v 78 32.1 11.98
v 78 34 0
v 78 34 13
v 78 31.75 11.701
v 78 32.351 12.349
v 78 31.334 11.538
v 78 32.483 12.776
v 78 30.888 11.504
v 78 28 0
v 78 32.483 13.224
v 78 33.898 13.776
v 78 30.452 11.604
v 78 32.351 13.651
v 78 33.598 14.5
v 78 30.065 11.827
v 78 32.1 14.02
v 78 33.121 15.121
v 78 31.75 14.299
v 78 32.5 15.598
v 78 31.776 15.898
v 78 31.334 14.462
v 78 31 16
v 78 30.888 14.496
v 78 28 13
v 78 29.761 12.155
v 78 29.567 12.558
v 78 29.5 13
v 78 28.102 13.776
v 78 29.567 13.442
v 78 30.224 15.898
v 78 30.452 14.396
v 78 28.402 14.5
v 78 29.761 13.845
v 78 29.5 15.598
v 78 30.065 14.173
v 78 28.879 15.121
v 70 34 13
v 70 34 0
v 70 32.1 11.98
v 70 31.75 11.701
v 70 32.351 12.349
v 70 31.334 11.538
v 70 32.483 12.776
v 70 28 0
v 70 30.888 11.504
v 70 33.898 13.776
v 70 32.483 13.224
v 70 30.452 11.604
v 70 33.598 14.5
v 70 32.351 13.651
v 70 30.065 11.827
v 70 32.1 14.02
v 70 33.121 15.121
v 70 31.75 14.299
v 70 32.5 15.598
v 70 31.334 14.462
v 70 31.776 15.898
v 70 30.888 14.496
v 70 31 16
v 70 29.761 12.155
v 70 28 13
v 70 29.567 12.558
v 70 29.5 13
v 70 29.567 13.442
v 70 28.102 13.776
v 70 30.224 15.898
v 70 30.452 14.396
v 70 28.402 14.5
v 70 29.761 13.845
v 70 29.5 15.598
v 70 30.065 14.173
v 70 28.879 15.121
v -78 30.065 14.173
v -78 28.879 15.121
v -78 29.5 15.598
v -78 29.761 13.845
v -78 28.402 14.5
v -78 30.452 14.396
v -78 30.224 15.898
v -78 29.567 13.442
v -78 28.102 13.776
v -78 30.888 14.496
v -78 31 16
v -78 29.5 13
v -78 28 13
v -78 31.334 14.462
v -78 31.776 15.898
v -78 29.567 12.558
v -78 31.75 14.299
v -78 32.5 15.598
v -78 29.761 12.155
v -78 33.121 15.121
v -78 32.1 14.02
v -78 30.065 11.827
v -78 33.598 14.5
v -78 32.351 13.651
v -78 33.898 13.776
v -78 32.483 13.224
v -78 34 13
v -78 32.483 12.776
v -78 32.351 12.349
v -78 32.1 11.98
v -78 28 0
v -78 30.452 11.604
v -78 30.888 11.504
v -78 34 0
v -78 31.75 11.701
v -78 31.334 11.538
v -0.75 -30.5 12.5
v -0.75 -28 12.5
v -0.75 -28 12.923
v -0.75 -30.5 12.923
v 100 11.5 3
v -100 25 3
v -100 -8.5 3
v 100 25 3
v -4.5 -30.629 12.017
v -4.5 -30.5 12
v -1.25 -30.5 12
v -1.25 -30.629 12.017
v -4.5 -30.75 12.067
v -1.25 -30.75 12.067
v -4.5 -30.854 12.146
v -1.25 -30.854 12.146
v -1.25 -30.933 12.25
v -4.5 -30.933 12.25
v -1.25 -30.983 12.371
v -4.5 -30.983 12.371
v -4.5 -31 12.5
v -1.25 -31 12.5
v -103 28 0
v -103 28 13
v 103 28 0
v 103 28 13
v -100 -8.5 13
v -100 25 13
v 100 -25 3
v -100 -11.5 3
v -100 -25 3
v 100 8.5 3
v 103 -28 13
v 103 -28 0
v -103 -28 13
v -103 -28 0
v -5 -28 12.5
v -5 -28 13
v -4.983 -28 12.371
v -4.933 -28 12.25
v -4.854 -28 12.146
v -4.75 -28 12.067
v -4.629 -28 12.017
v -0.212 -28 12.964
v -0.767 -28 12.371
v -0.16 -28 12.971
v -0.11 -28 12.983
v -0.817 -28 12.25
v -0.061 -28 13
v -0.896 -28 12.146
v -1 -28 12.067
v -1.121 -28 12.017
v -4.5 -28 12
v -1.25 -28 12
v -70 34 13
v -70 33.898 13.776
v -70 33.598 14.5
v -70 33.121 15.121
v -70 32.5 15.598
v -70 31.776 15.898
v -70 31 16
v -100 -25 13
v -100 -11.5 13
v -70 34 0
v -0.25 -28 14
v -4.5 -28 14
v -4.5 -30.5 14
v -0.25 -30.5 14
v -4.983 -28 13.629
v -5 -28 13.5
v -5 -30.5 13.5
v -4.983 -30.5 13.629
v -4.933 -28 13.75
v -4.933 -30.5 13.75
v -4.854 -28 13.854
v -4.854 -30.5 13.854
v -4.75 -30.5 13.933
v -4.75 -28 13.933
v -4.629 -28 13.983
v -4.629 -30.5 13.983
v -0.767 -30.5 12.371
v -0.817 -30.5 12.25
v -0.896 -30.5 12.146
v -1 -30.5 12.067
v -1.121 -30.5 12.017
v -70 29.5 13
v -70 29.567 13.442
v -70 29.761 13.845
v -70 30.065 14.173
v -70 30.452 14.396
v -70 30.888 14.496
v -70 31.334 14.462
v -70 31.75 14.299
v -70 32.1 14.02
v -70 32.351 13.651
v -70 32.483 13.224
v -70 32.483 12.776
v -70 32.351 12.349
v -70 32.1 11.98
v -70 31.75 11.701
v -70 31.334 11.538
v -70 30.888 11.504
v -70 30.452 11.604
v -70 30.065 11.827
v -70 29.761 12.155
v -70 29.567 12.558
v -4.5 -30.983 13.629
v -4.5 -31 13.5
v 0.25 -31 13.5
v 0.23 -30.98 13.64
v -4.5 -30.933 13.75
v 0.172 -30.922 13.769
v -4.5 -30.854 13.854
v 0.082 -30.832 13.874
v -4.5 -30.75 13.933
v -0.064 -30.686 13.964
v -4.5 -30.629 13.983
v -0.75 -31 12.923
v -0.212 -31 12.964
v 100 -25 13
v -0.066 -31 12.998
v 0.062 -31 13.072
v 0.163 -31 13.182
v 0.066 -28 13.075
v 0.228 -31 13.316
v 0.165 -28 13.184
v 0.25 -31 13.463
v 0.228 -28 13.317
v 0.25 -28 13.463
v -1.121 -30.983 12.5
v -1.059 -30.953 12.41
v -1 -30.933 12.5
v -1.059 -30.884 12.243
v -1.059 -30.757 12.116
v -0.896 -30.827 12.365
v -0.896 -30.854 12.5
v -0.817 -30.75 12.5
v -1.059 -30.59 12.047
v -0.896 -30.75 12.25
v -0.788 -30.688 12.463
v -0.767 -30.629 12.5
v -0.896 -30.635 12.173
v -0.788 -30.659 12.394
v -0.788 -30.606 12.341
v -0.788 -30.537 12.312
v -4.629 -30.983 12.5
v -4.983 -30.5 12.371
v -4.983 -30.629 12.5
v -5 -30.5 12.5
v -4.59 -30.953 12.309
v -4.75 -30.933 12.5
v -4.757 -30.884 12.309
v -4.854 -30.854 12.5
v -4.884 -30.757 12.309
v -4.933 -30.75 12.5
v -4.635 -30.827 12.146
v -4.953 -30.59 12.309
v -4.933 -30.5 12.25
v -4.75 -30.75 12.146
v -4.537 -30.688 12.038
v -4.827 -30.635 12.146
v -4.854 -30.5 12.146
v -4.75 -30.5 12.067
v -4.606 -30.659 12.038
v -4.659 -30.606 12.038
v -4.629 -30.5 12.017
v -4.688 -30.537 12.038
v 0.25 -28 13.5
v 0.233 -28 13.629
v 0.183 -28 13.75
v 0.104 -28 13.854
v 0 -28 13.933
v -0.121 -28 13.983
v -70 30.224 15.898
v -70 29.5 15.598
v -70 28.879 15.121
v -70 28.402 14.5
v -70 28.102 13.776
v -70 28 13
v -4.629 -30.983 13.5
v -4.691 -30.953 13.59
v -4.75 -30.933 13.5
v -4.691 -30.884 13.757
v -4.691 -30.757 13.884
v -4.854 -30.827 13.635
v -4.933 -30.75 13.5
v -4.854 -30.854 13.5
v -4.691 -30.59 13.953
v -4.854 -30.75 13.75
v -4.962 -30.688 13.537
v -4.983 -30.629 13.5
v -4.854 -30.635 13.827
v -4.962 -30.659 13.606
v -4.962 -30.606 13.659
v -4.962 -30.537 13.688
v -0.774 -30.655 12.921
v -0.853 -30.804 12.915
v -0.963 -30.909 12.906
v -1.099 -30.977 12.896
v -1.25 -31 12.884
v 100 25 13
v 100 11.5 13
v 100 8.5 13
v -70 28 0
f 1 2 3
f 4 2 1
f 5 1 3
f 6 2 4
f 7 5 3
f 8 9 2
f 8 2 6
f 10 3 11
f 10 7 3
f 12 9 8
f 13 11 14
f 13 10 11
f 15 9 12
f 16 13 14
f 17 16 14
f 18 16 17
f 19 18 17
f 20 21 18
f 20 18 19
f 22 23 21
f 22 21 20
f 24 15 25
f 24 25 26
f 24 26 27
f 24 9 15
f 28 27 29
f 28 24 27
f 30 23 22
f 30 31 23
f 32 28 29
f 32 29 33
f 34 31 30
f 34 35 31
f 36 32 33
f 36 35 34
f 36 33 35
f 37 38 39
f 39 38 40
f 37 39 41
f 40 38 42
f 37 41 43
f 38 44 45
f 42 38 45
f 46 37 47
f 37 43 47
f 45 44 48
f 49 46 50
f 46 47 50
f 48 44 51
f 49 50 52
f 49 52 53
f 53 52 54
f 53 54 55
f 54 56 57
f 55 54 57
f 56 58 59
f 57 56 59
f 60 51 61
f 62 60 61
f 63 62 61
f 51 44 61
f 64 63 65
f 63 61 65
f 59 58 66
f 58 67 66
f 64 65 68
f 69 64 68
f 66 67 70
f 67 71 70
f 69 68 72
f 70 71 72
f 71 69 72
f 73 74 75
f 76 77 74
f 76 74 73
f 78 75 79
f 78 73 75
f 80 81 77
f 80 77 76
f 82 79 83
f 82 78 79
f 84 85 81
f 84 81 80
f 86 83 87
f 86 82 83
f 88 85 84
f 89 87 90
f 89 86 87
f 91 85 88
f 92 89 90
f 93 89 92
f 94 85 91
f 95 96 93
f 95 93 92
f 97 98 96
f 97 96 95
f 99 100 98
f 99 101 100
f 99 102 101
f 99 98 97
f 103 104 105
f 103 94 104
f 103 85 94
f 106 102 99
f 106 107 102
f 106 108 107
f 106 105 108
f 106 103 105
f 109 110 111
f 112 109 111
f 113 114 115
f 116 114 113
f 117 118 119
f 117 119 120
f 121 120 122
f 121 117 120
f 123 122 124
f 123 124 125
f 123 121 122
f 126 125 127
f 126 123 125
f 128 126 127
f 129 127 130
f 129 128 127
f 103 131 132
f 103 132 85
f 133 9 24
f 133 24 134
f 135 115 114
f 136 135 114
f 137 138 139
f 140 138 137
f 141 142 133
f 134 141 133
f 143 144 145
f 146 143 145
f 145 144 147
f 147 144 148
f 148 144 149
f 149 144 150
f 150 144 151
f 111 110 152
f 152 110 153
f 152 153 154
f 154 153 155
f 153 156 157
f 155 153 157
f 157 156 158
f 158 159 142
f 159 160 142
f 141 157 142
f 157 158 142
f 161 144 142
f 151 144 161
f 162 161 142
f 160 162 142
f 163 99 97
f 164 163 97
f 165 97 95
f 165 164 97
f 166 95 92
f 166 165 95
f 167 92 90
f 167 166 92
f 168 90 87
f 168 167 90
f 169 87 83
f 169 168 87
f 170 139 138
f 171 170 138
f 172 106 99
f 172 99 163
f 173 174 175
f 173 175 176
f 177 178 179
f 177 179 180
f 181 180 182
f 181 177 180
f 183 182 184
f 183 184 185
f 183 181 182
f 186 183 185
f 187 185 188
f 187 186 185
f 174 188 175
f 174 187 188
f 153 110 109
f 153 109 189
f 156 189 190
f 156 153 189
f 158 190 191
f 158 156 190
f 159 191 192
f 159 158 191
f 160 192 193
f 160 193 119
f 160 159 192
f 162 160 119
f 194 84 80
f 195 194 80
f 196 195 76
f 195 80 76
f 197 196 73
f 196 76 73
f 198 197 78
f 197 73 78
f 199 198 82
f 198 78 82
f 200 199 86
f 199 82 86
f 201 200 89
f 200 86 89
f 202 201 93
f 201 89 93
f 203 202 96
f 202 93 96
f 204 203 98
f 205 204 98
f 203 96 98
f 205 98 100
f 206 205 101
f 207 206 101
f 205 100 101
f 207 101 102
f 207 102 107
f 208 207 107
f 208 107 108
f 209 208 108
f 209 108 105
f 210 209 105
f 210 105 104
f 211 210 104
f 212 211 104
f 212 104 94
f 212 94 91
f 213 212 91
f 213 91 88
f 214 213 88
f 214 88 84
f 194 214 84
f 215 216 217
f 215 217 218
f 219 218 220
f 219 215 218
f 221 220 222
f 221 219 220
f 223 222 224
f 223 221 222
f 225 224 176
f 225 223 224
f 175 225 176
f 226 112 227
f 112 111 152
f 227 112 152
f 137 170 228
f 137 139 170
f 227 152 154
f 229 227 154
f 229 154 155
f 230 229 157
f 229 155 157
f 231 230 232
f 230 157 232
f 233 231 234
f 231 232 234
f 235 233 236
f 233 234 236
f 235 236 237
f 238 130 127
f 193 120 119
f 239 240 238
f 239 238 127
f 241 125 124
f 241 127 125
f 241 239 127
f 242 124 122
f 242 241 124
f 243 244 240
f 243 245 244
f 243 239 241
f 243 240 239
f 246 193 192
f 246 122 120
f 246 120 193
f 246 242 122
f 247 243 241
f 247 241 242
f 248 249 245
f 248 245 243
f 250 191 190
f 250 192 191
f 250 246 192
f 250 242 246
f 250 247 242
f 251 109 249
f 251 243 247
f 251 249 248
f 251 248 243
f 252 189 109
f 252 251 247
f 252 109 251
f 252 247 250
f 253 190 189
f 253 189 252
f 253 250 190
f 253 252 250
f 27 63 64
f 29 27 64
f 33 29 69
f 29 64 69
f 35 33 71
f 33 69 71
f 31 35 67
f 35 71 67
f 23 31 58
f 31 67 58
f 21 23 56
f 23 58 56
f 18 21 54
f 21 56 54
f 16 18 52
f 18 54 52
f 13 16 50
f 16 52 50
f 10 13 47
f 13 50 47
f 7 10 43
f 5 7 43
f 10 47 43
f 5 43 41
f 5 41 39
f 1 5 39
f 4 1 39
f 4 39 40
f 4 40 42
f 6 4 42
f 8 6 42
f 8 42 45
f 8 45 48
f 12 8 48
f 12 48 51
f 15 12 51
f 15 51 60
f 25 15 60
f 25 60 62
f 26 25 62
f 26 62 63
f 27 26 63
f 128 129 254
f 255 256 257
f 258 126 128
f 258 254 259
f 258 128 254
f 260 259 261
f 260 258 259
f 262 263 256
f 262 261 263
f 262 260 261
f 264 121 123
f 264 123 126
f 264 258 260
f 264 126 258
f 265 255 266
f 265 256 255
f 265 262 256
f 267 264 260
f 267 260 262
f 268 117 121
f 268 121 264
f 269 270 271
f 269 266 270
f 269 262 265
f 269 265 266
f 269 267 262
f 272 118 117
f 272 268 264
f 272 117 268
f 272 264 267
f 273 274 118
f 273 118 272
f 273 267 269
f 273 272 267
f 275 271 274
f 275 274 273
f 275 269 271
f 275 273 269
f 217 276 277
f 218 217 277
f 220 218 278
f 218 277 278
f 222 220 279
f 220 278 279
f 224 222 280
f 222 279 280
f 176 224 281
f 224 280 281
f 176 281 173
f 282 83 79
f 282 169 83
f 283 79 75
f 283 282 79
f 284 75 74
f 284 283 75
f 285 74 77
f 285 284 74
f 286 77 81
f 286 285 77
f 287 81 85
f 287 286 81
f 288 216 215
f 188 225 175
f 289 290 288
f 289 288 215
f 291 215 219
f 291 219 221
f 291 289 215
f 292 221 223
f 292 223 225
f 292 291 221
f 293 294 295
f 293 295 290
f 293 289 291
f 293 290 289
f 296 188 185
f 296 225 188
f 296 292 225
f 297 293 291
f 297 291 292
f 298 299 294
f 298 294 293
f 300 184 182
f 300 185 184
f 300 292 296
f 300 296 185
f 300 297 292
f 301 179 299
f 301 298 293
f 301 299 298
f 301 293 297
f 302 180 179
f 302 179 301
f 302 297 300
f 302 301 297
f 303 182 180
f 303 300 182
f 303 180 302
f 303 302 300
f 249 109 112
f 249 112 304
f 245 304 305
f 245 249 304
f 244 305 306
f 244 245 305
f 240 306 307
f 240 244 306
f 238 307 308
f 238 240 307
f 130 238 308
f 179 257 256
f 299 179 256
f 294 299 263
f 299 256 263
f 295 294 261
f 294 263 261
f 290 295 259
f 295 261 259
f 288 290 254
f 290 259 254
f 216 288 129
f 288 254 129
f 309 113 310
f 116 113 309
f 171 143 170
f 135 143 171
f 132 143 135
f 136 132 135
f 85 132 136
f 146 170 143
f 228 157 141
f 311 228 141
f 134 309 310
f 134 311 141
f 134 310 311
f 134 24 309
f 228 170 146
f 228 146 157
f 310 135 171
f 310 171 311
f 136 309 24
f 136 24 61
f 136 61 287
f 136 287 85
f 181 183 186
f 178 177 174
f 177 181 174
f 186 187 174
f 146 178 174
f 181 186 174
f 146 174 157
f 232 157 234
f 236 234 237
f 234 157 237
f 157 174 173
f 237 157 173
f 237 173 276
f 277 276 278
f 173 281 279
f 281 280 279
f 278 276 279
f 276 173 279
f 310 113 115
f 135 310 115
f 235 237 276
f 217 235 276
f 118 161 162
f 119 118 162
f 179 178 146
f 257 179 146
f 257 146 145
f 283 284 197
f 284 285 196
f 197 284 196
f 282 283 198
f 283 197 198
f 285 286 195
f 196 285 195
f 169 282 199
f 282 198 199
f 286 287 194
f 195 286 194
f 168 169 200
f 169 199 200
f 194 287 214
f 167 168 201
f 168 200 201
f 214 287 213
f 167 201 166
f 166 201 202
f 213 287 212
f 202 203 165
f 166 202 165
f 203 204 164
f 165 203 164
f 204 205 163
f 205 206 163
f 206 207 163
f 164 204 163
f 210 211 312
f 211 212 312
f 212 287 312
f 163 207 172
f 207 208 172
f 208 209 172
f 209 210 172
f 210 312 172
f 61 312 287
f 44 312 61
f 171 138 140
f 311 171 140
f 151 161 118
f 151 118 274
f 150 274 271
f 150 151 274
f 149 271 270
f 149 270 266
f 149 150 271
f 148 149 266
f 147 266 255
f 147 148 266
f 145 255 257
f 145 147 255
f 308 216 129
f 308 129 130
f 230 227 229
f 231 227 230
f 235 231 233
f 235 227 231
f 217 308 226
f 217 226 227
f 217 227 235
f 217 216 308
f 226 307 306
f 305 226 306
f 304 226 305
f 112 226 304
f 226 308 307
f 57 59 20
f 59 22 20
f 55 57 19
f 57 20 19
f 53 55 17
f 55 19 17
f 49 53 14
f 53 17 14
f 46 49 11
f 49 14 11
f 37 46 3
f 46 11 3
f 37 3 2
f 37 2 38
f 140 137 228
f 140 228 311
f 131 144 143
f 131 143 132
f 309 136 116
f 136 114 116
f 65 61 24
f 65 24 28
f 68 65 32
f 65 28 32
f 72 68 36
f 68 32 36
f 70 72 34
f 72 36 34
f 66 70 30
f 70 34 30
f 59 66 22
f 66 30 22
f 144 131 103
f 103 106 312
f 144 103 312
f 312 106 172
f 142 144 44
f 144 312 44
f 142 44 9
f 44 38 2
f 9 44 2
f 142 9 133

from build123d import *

# Parameters (mm, degrees)
F0_W          = 206
F0_H          = 56
F1_DEPTH      = 13
F2_T          = -3
F4_DEPTH      = 10
F5_W          = 8
F5_H          = 13
F6_DEPTH      = 6
F7_W          = 8
F7_H          = 6
F8_DEPTH      = 3
F9_R          = 2.99999
F11_D         = 3
F12_W         = 5.25
F12_H         = 1
F13_DEPTH     = 3
F14_T1_DEPTH  = 5.5
F14_T3_DEPTH  = 4.1572120132
F14_T5_DEPTH  = 3.75
F14_T7_DEPTH  = 6
F14_T9_DEPTH  = 3.25
F14_T11_DEPTH = 2.5
F14_T13_DEPTH = 1
F14_S17_W     = 0.5
F14_S17_H     = 0.5
F14_T18_DEPTH = 0.5
F14_S23_W     = 0.5
F14_S23_H     = 0.5
F14_T24_DEPTH = 0.5
F14_S29_W     = 0.5
F14_S29_H     = 0.5
F14_T30_DEPTH = 0.5
F14_T36_DEPTH = 1.6727936268


# Not quite as in the source:
# - a fillet or chamfer that OpenCascade refuses, or shapes differently, is made with other operations: its cross-section is extruded or revolved along the edge and cut away or added
# - a fillet or chamfer is up to 0.001 mm smaller than in the source, because OpenCascade refuses the exact size


with BuildPart() as f1:
    # F0 (on Top) → F1 (new body)
    with BuildSketch(Plane.XY):
        Rectangle(F0_W, F0_H)
    extrude(amount=F1_DEPTH)

    # F2
    f2_openings = [f1.faces().sort_by_distance(p)[0] for p in [
        (0, 0, 13),
    ]]
    offset(amount=F2_T, openings=f2_openings)

    # F3 (on face) → F4 (join)
    with BuildSketch(Plane.XY.offset(3)):
        Polygon((100, 11.5), (-100, -8.5), (-100, -11.5), (100, 8.5), align=None)
    extrude(amount=F4_DEPTH)

    # F5 (on face) → F6 (join)
    with BuildSketch(Plane(origin=(0, 28, 0), x_dir=(-1, 0, 0), z_dir=(0, 1, 0))):
        with Locations((-74, 6.5)):
            Rectangle(F5_W, F5_H)
        with Locations((74, 6.5)):
            Rectangle(F5_W, F5_H)
    extrude(amount=F6_DEPTH)

    # F7 (on face) → F8 (join)
    with BuildSketch(Plane.XY.offset(13)):
        with Locations((-74, 31)):
            Rectangle(F7_W, F7_H)
        with Locations((74, 31)):
            Rectangle(F7_W, F7_H)
    extrude(amount=F8_DEPTH)

    # F9 (radius 3 in the source; OpenCascade refuses exactly that, so slightly less here)
    f9_edges = [f1.edges().sort_by_distance(p)[0] for p in [
        (-74, 28, 16),
        (-74, 34, 16),
        (74, 34, 16),
        (74, 28, 16),
    ]]
    fillet(f9_edges, radius=F9_R)

    # F11 (through all)
    with Locations(Plane.YZ.offset(78)):
        with Locations((31, 13)):
            Hole(F11_D / 2)

    # F12 (on face) → F13 (join)
    with BuildSketch(Plane.XZ.offset(28)):
        Polygon((-0.75, 12.9227936268), (0.25, 13), (-5, 13), (-5, 12), (-0.75, 12), align=None)
        with Locations((-2.375, 13.5)):
            Rectangle(F12_W, F12_H)
    extrude(amount=F13_DEPTH)

    # F14: fillet of radius 0.5 on 9 edges, made by hand

    # F14_s2 → F14_t1 (cut)
    with BuildSketch(Plane.XZ.offset(26.75)):
        with BuildLine():
            ThreePointArc((0.25, 13.5), (0.1035533906, 13.8535533906), (-0.25, 14))
            Line((-0.25, 14), (0.25, 14))
            Line((0.25, 14), (0.25, 13.5))
        make_face()
    extrude(amount=F14_T1_DEPTH, mode=Mode.SUBTRACT)

    # F14_s4 → F14_t3 (cut)
    with BuildSketch(Plane.XZ.offset(28)):
        with BuildLine():
            ThreePointArc((-0.211511355, 12.9643683821), (0.1169089277, 13.1232116701), (0.25, 13.4628848053))
            Line((0.25, 13.4628848053), (0.25, 13))
            Line((0.25, 13), (-0.211511355, 12.9643683821))
        make_face()
    extrude(amount=F14_T3_DEPTH, mode=Mode.SUBTRACT)

    # F14_s6 → F14_t5 (cut)
    with BuildSketch(Plane.XZ.offset(26.75)):
        with BuildLine():
            ThreePointArc((-5, 13.5), (-4.8535533906, 13.8535533906), (-4.5, 14))
            Line((-4.5, 14), (-5, 14))
            Line((-5, 14), (-5, 13.5))
        make_face()
    extrude(amount=F14_T5_DEPTH, mode=Mode.SUBTRACT)

    # F14_s8 → F14_t7 (cut)
    with BuildSketch(Plane.YZ.offset(-4.5)):
        with BuildLine():
            ThreePointArc((-31, 13.5), (-30.8535533906, 13.8535533906), (-30.5, 14))
            Line((-30.5, 14), (-31, 14))
            Line((-31, 14), (-31, 13.5))
        make_face()
    extrude(amount=F14_T7_DEPTH, mode=Mode.SUBTRACT)

    # F14_s10 → F14_t9 (cut)
    with BuildSketch(Plane.YZ.offset(-4.5)):
        with BuildLine():
            ThreePointArc((-30.5, 12), (-30.8535533906, 12.1464466094), (-31, 12.5))
            Line((-31, 12.5), (-31, 12))
            Line((-31, 12), (-30.5, 12))
        make_face()
    extrude(amount=F14_T9_DEPTH, mode=Mode.SUBTRACT)

    # F14_s12 → F14_t11 (cut)
    with BuildSketch(Plane.XZ.offset(28)):
        with BuildLine():
            ThreePointArc((-0.75, 12.5), (-0.8964466094, 12.1464466094), (-1.25, 12))
            Line((-1.25, 12), (-0.75, 12))
            Line((-0.75, 12), (-0.75, 12.5))
        make_face()
        with BuildLine():
            ThreePointArc((-4.5, 12), (-4.8535533906, 12.1464466094), (-5, 12.5))
            Line((-5, 12.5), (-5, 12))
            Line((-5, 12), (-4.5, 12))
        make_face()
    extrude(amount=F14_T11_DEPTH, mode=Mode.SUBTRACT)

    # F14_s14 → F14_t13 (cut)
    with BuildSketch(Plane.XY.offset(12.5)):
        with BuildLine():
            ThreePointArc((-5, -30.5), (-4.8535533906, -30.8535533906), (-4.5, -31))
            Line((-4.5, -31), (-5, -31))
            Line((-5, -31), (-5, -30.5))
        make_face()
    extrude(amount=F14_T13_DEPTH, mode=Mode.SUBTRACT)


with BuildPart() as f14_tool16:
    # F14_s17 → F14_t18 (new body)
    with BuildSketch(Plane.YZ.offset(-4.5)):
        with Locations((-30.75, 13.75)):
            Rectangle(F14_S17_W, F14_S17_H)
    extrude(amount=-F14_T18_DEPTH)

    # F14_s19 → F14_t20 (revolve, cut)
    with BuildSketch(Plane(origin=(-4.5, -30.5, 13.5), x_dir=(0, 0.7071067812, -0.7071067812), z_dir=(0, 0.7071067812, 0.7071067812))):
        with BuildLine():
            ThreePointArc((0, -0.5), (0.5, 0), (0, 0.5))
            Line((0, 0.5), (0, -0.5))
        make_face()
    revolve(axis=Axis((-4.5, -30.5, 13.5), (-1, 0, 0)), mode=Mode.SUBTRACT)


with BuildPart() as f1_1:
    add(f1.part)

    # F14_t15: cut F14_tool16
    add(f14_tool16.part, mode=Mode.SUBTRACT)


with BuildPart() as f14_tool22:
    # F14_s23 → F14_t24 (new body)
    with BuildSketch(Plane.XY.offset(12.5)):
        with Locations((-4.75, -30.75)):
            Rectangle(F14_S23_W, F14_S23_H)
    extrude(amount=-F14_T24_DEPTH)

    # F14_s25 → F14_t26 (revolve, cut)
    with BuildSketch(Plane(origin=(-4.5, -30.5, 12.5), x_dir=(0.7071067812, 0.7071067812, 0), z_dir=(-0.7071067812, 0.7071067812, 0))):
        with BuildLine():
            ThreePointArc((0, -0.5), (0.5, 0), (0, 0.5))
            Line((0, 0.5), (0, -0.5))
        make_face()
    revolve(axis=Axis((-4.5, -30.5, 12.5), (0, 0, -1)), mode=Mode.SUBTRACT)


with BuildPart() as f1_2:
    add(f1_1.part)

    # F14_t21: cut F14_tool22
    add(f14_tool22.part, mode=Mode.SUBTRACT)


with BuildPart() as f14_tool28:
    # F14_s29 → F14_t30 (new body)
    with BuildSketch(Plane.YZ.offset(-1.25)):
        with Locations((-30.75, 12.25)):
            Rectangle(F14_S29_W, F14_S29_H)
    extrude(amount=F14_T30_DEPTH)

    # F14_s31 → F14_t32 (revolve, cut)
    with BuildSketch(Plane(origin=(-1.25, -30.5, 12.5), x_dir=(0, 0.7071067812, 0.7071067812), z_dir=(0, 0.7071067812, -0.7071067812))):
        with BuildLine():
            ThreePointArc((0, -0.5), (0.5, 0), (0, 0.5))
            Line((0, 0.5), (0, -0.5))
        make_face()
    revolve(axis=Axis((-1.25, -30.5, 12.5), (1, 0, 0)), mode=Mode.SUBTRACT)


with BuildPart() as f1_3:
    add(f1_2.part)

    # F14_t27: cut F14_tool28
    add(f14_tool28.part, mode=Mode.SUBTRACT)


with BuildPart() as f14_tool34:
    # F14_s35 → F14_t36 (new body)
    with BuildSketch(Plane.XY.offset(12.5)):
        with BuildLine():
            ThreePointArc((-0.75, -30.5), (-0.8964466094, -30.8535533906), (-1.25, -31))
            Line((-1.25, -31), (-0.75, -31))
            Line((-0.75, -31), (-0.75, -30.5))
        make_face()
    extrude(amount=F14_T36_DEPTH)

    split(bisect_by=Plane(origin=(-0.9962541501, 0, 12.903781237), x_dir=(0, 1, 0), z_dir=(0.07697729, 0, -0.9970328464)), keep=Keep.TOP)


with BuildPart() as f1_4:
    add(f1_3.part)

    # F14_t33: cut F14_tool34
    add(f14_tool34.part, mode=Mode.SUBTRACT)


solid = f1_4.part
